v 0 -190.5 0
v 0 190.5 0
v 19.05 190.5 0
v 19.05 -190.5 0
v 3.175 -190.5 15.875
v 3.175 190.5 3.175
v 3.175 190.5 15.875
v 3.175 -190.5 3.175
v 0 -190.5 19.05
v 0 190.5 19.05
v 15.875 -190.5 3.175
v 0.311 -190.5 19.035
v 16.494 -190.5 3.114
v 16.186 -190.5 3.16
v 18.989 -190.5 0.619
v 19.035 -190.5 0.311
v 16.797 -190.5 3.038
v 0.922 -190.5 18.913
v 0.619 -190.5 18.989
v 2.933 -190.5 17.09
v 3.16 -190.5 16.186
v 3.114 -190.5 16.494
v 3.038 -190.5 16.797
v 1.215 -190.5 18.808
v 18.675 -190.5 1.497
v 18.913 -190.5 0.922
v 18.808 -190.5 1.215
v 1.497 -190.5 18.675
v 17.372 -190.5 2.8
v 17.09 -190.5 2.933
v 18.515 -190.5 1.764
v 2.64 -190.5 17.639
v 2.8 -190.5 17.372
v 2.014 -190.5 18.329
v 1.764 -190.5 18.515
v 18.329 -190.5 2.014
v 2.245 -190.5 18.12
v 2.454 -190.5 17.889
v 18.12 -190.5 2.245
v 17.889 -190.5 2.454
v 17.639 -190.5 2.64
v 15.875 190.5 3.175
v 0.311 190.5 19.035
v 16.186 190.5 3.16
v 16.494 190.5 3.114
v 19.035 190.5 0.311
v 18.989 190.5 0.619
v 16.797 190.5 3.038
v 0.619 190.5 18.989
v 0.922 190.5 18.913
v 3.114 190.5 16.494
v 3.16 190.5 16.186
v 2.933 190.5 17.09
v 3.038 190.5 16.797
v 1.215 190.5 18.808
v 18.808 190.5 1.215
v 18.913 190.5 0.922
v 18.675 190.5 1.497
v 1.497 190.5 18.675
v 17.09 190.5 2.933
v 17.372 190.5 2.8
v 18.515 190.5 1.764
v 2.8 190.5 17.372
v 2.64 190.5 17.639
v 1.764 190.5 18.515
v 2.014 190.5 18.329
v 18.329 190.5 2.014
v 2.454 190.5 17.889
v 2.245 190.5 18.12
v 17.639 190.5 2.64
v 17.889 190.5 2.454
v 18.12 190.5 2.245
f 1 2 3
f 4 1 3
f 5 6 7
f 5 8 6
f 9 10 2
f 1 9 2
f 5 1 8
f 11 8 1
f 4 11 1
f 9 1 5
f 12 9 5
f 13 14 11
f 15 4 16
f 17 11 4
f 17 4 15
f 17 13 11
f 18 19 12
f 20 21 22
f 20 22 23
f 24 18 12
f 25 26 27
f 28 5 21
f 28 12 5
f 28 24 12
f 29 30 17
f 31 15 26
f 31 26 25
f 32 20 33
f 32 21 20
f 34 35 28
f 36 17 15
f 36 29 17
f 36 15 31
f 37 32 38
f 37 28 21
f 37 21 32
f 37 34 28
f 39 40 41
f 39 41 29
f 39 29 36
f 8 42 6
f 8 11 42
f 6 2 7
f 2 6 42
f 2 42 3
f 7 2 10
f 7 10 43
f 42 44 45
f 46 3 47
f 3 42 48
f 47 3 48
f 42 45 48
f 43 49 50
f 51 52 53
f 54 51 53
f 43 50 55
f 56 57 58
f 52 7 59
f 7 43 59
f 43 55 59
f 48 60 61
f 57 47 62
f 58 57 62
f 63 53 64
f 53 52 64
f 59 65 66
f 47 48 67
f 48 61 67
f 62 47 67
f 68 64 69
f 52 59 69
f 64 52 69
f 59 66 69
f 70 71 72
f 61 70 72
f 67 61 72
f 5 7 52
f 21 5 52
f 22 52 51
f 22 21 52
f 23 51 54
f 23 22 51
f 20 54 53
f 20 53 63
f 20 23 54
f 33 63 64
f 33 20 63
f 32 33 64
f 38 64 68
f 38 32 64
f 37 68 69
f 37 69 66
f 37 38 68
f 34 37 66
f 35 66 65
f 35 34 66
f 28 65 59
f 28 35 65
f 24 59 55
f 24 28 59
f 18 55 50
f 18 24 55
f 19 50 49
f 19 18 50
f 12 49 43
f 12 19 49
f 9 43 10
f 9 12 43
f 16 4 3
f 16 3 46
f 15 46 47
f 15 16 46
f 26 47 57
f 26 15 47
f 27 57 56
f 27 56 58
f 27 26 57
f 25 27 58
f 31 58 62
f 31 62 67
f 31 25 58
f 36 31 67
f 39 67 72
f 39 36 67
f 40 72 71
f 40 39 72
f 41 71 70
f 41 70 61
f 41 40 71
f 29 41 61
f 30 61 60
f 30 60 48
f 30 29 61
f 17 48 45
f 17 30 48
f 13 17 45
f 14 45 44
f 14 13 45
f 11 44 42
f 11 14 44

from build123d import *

# Parameters (mm, degrees)
F1_DEPTH = 190.5


with BuildPart() as f1:
    # F0 (on Front) → F1 (new body, symmetric)
    with BuildSketch(Plane.XZ):
        with BuildLine():
            ThreePointArc((3.175, 15.875), (2.245064, 18.120064), (0, 19.05))
            Line((0, 19.05), (0, 0))
            Line((0, 0), (19.05, 0))
            ThreePointArc((19.05, 0), (18.120064, 2.245064), (15.875, 3.175))
            Line((15.875, 3.175), (3.175, 3.175))
            Line((3.175, 3.175), (3.175, 15.875))
        make_face()
    extrude(amount=F1_DEPTH, both=True)


solid = f1.part
